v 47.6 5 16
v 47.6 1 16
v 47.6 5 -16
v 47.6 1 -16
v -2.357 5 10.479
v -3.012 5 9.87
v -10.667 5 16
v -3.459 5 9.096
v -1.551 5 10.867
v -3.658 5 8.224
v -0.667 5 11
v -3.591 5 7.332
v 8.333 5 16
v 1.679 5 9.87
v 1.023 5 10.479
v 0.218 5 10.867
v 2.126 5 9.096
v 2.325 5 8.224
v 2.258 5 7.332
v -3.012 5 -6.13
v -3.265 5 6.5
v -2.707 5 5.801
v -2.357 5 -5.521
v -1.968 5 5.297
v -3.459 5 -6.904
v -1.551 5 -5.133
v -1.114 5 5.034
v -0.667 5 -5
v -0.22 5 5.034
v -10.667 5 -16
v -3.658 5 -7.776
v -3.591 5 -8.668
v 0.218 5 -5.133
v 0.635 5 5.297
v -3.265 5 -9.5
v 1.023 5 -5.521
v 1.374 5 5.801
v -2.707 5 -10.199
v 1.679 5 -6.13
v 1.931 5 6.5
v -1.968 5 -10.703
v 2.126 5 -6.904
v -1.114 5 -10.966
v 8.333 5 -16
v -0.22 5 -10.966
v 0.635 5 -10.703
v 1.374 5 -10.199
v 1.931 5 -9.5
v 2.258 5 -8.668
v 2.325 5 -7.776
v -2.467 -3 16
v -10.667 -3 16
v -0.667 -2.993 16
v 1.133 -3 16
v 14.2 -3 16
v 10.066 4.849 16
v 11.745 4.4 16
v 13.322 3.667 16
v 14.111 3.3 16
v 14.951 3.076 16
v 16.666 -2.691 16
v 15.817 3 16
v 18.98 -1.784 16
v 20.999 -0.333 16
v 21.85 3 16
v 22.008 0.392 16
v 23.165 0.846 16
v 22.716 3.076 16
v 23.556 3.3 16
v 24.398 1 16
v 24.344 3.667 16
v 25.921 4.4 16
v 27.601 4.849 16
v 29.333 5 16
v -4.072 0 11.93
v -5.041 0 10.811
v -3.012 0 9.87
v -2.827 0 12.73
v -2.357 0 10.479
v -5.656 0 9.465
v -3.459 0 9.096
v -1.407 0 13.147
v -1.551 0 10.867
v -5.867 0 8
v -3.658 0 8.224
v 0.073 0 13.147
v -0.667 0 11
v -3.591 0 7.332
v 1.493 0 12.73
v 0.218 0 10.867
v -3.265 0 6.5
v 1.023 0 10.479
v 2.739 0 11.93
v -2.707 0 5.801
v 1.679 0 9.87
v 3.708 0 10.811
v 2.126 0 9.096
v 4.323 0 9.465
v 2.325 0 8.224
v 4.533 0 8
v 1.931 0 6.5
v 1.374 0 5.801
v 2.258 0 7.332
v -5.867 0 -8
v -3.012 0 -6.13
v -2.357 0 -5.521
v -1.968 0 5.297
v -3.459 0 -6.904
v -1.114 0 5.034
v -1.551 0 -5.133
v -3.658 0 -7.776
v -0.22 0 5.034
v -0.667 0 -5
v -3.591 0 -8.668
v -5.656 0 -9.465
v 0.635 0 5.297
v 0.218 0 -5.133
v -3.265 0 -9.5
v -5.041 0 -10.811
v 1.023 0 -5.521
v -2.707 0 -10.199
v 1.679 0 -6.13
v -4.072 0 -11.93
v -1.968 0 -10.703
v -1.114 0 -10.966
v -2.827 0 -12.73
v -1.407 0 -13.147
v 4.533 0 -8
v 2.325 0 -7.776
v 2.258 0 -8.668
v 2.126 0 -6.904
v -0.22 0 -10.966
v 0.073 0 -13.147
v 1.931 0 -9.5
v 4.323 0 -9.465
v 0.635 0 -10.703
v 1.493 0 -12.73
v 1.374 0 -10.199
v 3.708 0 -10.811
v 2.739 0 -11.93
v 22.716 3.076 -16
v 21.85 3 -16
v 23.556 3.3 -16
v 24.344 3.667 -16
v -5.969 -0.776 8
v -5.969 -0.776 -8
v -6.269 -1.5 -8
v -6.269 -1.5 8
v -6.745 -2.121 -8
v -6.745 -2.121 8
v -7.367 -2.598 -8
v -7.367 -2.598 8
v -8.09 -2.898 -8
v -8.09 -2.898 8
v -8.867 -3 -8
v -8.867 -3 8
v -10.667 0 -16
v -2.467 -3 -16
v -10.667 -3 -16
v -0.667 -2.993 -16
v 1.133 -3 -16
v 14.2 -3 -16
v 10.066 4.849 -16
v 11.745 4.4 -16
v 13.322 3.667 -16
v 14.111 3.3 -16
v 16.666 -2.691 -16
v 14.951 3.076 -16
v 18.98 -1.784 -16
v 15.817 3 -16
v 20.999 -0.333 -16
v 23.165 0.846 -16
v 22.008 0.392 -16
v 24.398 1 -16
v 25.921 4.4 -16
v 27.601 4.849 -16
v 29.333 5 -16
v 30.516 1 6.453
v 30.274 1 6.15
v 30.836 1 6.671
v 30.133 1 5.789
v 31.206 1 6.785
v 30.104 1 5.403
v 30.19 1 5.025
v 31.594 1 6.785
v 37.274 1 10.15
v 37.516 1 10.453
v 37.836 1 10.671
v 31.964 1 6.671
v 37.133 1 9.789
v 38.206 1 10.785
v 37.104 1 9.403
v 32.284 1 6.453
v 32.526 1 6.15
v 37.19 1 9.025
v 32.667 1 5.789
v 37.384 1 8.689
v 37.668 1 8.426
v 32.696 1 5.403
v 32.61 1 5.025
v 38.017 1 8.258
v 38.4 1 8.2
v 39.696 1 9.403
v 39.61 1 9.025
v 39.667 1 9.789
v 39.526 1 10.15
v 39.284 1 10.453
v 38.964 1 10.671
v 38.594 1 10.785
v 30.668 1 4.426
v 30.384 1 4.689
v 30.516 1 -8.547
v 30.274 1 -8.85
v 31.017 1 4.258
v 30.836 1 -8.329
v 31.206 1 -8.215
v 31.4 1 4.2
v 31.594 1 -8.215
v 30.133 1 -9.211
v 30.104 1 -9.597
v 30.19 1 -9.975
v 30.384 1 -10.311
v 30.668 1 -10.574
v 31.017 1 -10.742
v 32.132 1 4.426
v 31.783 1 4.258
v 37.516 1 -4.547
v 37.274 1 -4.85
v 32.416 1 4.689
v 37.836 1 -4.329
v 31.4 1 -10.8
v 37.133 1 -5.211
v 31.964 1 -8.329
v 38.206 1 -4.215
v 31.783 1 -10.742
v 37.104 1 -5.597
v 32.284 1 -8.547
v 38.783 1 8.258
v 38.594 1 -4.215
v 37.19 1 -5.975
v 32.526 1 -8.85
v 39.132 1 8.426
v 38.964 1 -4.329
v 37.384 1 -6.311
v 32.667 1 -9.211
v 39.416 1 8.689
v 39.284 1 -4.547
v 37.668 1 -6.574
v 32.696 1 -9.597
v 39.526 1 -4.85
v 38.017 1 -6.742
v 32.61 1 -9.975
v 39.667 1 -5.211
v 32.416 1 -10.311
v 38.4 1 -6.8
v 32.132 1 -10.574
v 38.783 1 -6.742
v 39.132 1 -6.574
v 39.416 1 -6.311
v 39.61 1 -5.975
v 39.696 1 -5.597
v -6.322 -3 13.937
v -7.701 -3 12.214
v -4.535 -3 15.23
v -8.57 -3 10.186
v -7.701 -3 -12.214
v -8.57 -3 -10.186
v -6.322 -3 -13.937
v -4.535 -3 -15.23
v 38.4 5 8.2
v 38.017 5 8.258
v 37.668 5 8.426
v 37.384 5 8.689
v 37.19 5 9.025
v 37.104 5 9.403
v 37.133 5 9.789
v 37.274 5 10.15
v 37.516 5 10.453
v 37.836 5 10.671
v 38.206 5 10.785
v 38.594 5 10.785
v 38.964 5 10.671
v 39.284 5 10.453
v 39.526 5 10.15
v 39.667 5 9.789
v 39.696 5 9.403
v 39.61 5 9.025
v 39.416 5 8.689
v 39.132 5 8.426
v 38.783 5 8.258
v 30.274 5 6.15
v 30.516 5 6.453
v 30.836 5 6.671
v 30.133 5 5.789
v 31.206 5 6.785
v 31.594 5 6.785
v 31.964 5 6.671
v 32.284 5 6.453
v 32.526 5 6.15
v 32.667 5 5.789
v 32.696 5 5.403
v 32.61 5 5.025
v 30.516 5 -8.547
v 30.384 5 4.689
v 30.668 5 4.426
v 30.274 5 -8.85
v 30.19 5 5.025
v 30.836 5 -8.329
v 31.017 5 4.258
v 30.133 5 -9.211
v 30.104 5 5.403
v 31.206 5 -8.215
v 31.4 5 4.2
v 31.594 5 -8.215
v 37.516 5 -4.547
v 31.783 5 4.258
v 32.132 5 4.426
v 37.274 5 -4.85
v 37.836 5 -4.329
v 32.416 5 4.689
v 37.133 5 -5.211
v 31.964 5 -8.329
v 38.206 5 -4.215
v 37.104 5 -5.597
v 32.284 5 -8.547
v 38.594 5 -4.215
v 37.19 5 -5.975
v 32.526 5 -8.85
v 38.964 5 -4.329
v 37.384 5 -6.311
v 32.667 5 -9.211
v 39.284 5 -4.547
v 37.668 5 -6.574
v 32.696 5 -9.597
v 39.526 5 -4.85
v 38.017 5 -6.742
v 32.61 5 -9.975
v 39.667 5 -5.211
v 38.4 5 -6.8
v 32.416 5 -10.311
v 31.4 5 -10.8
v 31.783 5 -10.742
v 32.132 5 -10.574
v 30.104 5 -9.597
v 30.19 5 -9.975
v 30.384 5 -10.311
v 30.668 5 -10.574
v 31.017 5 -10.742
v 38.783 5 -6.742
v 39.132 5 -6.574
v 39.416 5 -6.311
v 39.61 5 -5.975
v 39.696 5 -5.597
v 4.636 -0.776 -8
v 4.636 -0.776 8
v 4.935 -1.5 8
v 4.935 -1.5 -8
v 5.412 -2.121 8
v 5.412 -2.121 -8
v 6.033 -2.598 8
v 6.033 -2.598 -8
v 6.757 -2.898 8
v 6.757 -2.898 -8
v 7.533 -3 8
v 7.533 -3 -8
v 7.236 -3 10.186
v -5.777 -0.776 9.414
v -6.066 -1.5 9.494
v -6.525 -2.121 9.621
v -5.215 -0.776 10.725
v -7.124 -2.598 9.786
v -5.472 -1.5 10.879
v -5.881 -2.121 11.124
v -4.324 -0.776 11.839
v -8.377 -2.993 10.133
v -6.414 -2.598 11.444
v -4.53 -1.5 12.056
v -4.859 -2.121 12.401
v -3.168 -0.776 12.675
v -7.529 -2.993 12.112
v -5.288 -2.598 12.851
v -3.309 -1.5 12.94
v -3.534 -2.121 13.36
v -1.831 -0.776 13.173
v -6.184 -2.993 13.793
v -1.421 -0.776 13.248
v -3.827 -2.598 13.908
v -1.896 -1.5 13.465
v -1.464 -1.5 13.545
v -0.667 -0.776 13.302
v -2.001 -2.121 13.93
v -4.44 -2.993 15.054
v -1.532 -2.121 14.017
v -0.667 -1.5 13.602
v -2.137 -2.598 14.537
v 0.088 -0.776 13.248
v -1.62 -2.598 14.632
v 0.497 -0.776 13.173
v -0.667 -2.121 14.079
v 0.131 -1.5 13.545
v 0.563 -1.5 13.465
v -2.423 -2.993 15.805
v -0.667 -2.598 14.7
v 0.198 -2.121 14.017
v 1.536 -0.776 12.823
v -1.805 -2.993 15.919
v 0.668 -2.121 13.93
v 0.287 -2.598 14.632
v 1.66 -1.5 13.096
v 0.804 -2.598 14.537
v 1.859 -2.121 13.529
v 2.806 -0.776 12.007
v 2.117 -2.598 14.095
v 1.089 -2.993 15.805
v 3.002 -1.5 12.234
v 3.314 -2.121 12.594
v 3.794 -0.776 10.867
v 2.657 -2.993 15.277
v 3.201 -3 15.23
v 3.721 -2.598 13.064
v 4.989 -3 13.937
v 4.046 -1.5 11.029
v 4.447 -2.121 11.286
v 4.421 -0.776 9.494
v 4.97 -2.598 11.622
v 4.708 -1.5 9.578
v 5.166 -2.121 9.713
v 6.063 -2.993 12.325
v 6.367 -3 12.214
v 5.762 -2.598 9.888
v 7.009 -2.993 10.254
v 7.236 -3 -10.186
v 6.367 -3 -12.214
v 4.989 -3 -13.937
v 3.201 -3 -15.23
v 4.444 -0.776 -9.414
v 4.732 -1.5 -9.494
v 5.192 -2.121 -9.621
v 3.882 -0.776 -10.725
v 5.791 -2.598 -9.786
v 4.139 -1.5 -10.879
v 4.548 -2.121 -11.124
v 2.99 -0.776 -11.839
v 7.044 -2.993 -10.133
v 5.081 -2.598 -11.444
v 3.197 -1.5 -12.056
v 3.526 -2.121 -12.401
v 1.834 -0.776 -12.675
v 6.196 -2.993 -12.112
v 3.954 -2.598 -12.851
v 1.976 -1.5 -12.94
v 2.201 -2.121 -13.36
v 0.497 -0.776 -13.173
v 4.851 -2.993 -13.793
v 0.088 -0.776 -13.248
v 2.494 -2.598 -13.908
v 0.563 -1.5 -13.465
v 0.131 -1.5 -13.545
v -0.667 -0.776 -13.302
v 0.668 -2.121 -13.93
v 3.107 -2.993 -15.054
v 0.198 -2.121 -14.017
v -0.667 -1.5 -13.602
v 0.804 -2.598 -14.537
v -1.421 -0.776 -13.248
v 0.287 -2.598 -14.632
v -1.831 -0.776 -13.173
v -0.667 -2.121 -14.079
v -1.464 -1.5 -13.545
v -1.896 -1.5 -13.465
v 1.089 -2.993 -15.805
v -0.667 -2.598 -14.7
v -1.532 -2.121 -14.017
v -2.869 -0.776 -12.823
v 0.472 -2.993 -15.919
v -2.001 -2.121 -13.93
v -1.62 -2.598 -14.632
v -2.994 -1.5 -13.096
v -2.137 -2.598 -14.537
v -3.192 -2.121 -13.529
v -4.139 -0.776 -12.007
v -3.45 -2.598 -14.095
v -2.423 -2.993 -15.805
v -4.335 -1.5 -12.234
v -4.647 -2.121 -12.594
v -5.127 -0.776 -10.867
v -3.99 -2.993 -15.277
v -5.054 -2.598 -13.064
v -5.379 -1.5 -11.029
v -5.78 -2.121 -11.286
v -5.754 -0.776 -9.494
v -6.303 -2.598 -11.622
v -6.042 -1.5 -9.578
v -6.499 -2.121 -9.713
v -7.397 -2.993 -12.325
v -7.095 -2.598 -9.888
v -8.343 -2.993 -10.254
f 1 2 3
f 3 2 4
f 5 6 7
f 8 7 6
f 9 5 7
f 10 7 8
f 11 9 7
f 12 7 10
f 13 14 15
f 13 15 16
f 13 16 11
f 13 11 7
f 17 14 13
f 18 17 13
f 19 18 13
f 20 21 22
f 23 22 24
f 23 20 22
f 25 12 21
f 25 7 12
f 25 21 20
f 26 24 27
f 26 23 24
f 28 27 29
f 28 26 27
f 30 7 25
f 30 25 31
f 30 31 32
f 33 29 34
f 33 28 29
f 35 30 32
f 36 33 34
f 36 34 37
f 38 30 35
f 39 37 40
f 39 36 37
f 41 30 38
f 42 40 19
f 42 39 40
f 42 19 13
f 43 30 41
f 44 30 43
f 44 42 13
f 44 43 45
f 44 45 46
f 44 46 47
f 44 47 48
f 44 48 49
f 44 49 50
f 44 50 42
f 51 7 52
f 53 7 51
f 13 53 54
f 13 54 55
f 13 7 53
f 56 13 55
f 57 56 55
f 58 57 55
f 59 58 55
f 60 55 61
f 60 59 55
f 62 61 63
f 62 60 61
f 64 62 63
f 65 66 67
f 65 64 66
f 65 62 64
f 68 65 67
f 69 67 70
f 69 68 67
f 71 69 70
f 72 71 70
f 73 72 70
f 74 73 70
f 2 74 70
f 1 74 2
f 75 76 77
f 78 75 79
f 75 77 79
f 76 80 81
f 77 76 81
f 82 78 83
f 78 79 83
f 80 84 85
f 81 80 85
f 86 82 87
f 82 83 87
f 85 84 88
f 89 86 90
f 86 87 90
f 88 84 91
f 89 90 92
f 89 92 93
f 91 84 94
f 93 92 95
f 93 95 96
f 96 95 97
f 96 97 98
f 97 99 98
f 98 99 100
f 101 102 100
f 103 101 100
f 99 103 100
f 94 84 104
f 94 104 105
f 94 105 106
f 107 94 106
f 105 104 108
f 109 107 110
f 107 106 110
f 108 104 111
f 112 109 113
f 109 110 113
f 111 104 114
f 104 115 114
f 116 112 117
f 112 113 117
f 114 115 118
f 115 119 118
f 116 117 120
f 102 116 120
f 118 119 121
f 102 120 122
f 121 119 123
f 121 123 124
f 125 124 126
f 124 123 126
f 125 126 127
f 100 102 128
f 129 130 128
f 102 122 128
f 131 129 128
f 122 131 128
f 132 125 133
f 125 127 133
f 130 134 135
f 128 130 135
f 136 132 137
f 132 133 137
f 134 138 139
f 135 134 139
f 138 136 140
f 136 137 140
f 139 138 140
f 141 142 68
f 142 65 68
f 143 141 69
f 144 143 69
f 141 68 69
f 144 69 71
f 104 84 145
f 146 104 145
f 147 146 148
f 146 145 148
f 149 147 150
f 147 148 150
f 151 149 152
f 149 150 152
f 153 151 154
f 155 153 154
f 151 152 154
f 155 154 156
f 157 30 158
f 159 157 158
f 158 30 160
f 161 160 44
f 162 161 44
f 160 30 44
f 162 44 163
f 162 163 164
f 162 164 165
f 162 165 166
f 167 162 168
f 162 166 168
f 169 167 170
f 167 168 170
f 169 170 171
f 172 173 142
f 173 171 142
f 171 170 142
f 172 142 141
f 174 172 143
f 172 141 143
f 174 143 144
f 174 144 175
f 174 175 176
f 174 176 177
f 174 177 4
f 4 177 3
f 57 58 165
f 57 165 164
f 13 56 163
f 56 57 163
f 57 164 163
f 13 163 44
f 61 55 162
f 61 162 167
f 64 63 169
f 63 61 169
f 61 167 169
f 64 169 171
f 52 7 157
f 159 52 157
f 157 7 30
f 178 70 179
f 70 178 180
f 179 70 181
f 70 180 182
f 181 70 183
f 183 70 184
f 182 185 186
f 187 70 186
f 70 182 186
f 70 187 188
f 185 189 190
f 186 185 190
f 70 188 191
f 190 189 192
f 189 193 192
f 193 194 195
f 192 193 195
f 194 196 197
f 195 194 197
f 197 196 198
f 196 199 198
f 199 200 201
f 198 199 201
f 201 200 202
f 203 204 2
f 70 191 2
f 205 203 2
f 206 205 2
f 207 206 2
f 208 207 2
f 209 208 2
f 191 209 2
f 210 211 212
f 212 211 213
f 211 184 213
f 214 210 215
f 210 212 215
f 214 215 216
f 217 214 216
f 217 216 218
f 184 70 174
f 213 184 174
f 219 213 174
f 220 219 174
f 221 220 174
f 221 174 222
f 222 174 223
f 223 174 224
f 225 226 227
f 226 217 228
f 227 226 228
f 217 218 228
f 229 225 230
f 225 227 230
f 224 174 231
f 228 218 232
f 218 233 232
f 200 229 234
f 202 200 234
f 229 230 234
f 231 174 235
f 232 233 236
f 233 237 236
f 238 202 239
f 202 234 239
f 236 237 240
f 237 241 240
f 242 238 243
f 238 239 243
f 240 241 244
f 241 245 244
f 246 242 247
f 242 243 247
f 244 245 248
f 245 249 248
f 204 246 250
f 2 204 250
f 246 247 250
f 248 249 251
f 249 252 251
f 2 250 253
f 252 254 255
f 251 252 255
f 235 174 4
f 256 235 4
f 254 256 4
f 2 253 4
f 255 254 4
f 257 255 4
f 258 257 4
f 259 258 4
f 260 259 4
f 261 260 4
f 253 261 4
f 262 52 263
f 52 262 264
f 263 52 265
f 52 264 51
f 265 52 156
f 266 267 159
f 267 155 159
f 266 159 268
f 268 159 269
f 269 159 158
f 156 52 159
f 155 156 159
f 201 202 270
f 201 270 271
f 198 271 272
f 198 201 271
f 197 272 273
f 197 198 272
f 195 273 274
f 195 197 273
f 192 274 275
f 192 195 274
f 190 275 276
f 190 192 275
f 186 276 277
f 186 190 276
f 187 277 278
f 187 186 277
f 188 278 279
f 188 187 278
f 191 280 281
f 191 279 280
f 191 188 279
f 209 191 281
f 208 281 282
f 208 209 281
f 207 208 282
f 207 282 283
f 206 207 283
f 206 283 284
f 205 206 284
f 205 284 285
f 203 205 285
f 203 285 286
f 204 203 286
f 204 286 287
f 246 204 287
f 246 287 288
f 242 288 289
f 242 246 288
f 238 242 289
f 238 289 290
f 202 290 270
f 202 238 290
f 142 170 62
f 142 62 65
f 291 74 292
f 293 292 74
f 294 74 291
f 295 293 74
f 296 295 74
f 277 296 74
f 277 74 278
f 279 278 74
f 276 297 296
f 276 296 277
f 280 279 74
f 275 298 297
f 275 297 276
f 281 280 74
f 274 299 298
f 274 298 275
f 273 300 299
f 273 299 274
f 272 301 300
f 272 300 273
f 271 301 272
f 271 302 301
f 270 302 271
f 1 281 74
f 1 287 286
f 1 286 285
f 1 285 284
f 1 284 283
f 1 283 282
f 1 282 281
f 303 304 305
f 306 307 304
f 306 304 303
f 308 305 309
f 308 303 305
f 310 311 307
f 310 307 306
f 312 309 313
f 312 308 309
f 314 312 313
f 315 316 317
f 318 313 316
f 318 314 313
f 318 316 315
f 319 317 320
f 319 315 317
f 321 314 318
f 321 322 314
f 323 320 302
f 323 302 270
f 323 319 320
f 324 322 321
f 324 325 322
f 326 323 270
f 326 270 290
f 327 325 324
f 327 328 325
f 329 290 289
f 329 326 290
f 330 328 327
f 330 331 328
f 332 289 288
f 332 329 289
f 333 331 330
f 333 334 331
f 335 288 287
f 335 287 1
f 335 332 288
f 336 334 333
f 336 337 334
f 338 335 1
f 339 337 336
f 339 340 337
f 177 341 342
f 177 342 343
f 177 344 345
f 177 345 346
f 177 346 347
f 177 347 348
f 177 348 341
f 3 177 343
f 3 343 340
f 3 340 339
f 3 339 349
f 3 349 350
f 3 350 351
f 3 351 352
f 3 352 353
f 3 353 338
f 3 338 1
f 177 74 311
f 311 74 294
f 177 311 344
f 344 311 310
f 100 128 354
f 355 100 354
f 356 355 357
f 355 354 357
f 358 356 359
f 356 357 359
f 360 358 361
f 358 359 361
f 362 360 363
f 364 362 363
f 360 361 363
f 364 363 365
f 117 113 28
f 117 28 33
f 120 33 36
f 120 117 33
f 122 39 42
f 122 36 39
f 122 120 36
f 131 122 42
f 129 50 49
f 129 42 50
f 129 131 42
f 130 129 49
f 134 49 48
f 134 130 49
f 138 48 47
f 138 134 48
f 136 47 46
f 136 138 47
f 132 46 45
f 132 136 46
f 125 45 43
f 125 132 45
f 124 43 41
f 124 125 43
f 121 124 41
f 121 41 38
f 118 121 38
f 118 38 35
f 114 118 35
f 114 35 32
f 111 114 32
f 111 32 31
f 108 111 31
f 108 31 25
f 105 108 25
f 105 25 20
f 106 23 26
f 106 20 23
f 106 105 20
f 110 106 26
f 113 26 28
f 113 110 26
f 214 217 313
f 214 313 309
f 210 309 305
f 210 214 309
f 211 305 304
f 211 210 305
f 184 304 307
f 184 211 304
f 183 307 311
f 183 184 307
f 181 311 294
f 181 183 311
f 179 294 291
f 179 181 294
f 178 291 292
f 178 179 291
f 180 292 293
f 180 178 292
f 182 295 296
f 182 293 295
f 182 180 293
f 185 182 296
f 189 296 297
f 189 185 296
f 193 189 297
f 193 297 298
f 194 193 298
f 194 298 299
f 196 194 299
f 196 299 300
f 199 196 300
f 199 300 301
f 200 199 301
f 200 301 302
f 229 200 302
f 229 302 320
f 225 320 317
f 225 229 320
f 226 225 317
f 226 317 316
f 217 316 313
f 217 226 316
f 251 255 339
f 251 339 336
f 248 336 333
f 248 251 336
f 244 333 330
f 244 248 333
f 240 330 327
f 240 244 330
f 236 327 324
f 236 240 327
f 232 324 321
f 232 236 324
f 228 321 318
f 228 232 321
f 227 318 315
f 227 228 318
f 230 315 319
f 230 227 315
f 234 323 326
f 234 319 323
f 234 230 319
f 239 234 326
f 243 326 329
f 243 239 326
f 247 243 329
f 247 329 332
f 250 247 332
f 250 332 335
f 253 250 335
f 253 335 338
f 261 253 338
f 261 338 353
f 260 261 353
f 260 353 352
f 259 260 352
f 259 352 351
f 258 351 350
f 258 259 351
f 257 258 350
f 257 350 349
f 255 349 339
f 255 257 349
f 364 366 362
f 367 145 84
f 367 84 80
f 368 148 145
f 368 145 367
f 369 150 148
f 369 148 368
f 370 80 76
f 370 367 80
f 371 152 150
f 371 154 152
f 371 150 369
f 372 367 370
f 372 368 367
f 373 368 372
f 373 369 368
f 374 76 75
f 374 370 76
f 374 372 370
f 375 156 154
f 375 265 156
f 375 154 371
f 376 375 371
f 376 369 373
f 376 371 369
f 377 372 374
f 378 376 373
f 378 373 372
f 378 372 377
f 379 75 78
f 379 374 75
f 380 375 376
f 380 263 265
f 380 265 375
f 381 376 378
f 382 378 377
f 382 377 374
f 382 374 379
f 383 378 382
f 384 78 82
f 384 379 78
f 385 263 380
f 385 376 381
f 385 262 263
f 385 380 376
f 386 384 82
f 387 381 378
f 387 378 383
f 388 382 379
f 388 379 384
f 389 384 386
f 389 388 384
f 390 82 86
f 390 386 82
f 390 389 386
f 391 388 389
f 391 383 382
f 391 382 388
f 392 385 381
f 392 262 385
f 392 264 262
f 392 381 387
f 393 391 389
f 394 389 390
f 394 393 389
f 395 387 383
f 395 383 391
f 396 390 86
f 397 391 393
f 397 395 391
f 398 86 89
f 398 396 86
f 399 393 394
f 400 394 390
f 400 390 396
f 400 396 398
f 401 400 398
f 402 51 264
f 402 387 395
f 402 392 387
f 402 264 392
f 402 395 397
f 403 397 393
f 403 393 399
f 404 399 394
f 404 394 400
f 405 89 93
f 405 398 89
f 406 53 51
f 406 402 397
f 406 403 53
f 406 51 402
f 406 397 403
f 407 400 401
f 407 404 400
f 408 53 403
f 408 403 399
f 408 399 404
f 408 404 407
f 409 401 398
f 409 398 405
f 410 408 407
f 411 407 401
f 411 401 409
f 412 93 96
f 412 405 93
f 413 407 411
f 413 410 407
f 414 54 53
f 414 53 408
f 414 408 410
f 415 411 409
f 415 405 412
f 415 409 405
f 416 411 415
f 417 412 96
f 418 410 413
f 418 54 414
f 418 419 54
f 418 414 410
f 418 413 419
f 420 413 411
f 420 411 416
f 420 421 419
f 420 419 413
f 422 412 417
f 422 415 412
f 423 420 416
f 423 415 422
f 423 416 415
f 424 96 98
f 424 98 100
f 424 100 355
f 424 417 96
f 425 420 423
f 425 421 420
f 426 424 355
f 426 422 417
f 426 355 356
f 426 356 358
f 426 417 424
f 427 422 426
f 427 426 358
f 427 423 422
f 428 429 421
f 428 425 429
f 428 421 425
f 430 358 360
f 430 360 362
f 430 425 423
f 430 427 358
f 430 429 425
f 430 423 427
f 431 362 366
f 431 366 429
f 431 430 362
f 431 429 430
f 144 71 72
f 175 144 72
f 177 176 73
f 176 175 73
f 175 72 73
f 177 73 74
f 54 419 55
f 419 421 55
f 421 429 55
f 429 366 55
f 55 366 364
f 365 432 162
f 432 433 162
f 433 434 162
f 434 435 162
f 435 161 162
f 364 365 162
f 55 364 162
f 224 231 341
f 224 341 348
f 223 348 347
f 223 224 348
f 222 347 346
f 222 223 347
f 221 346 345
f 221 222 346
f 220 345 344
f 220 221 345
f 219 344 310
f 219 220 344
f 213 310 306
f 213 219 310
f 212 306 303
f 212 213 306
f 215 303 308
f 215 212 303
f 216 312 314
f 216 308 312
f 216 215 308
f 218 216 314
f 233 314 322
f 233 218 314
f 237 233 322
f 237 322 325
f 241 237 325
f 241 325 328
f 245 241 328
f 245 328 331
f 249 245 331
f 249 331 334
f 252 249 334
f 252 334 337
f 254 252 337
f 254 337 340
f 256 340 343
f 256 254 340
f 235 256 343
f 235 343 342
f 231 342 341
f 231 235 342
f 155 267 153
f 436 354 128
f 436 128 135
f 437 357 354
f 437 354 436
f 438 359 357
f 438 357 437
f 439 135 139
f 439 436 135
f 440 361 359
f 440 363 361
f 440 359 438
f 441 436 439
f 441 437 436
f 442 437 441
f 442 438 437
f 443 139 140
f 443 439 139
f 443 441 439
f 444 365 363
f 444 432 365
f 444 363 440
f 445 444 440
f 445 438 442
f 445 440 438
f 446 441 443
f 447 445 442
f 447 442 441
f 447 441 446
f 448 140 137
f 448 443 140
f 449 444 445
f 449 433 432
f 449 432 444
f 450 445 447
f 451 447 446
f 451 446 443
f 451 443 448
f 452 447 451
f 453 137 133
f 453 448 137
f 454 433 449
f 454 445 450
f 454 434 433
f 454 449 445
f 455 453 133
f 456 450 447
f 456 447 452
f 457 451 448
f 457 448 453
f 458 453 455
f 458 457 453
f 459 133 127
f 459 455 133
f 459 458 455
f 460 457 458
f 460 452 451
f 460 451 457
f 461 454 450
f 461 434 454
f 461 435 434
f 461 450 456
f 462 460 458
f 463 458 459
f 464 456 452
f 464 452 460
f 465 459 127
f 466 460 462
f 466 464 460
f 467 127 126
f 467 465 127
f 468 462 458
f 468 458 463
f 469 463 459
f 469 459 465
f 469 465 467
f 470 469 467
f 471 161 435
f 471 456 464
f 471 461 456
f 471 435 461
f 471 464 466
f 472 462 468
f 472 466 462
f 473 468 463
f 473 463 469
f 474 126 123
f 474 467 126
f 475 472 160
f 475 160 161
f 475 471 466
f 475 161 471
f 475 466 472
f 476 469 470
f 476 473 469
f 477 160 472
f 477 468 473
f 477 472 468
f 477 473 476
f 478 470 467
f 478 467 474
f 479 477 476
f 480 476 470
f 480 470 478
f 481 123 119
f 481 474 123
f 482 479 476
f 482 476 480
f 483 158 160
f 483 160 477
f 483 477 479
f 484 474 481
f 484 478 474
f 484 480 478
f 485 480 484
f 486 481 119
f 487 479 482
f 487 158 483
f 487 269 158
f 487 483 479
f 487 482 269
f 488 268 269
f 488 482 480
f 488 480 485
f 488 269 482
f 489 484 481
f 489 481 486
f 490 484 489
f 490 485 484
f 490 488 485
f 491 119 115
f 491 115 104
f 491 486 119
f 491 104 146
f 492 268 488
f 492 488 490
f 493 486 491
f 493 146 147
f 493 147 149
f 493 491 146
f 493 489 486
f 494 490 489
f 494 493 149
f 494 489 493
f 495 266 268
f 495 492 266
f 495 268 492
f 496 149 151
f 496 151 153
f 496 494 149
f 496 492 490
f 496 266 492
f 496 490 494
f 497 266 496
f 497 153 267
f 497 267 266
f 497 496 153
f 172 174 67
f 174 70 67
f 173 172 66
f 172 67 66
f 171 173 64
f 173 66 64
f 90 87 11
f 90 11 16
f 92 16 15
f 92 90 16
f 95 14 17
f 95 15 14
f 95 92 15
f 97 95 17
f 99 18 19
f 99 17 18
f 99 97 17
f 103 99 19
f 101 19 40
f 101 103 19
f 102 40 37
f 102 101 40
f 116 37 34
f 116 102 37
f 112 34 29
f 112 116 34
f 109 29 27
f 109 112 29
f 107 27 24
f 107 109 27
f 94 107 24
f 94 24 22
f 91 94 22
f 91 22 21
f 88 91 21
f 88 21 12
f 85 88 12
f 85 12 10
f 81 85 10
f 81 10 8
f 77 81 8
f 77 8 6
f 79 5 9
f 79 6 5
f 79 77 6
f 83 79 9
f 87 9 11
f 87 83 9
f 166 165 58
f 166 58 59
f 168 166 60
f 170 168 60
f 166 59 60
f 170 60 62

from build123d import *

# Parameters (mm, degrees)
SKETCH1_W               = 21.333333334
SKETCH1_H               = 32
BOSS_EXTRUDE1_DEPTH     = 5
SKETCH2_W               = 37.6
SKETCH2_H               = 32
BOSS_EXTRUDE2_DEPTH     = 5
SKETCH7_R               = 1.3
CUT_EXTRUDE2_DEPTH      = 10
CUT_EXTRUDE3_DEPTH      = 51.465433715
CUT_EXTRUDE3_DEPTH_BACK = 51.465433715
SKETCH8_W               = 25.4
SKETCH8_H               = 1
SKETCH8_W_2             = 9
SKETCH8_H_2             = 2
SKETCH9_W               = 32.866666667
SKETCH9_H               = 32
BOSS_EXTRUDE3_DEPTH     = 3
CUT_EXTRUDE4_DEPTH      = 51.465433715
CUT_EXTRUDE4_DEPTH_BACK = 51.465433715
SKETCH10_R              = 3
CUT_EXTRUDE5_DEPTH      = 8
FILLET8_R               = 3
FILLET9_R               = 10
FILLET10_R              = 5


with BuildPart() as part:
    # Sketch1 → Boss-Extrude1 (new body)
    with BuildSketch(Plane(origin=(0, 0, 0), x_dir=(1, 0, 0), z_dir=(0, 1, 0))):
        Rectangle(SKETCH1_W, SKETCH1_H)
    extrude(amount=BOSS_EXTRUDE1_DEPTH)

    # Sketch2 → Boss-Extrude2 (add)
    with BuildSketch(Plane(origin=(0, 0, 0), x_dir=(1, 0, 0), z_dir=(0, 1, 0))):
        with Locations((28.8, 0)):
            Rectangle(SKETCH2_W, SKETCH2_H)
    extrude(amount=BOSS_EXTRUDE2_DEPTH)

    # Sketch7 → Cut-Extrude2 (cut)
    with BuildSketch(Plane(origin=(0, 0, 0), x_dir=(1, 0, 0), z_dir=(0, 1, 0))):
        with Locations(Location((38.4, -9.5, 0), (0, 0, 90))):
            Circle(SKETCH7_R)
        with Locations(Location((31.4, -5.5, 0), (0, 0, 90))):
            Circle(SKETCH7_R)
        with Locations(Location((38.4, 5.5, 0), (0, 0, 90))):
            Circle(SKETCH7_R)
        with Locations(Location((31.4, 9.5, 0), (0, 0, 90))):
            Circle(SKETCH7_R)
    extrude(amount=CUT_EXTRUDE2_DEPTH, mode=Mode.SUBTRACT)

    # Sketch8 → Cut-Extrude3 (cut, two sides: drawn at the far end of the back side and taken through both)
    with BuildSketch(Plane.XY.offset(-CUT_EXTRUDE3_DEPTH_BACK)):
        with Locations((34.9, 0.5)):
            Rectangle(SKETCH8_W, SKETCH8_H)
        with Locations((18.833333333, 4)):
            Rectangle(SKETCH8_W_2, SKETCH8_H_2)
    extrude(amount=CUT_EXTRUDE3_DEPTH + CUT_EXTRUDE3_DEPTH_BACK, mode=Mode.SUBTRACT)

    # Sketch9 → Boss-Extrude3 (add)
    with BuildSketch(Plane(origin=(0, 0, 0), x_dir=(1, 0, 0), z_dir=(0, 1, 0))):
        with Locations((5.766666667, 0)):
            Rectangle(SKETCH9_W, SKETCH9_H)
    extrude(amount=-BOSS_EXTRUDE3_DEPTH)

    # Sketch10 → Cut-Extrude4 (cut, two sides: drawn at the far end of the back side and taken through both)
    with BuildSketch(Plane(origin=(0, 0, 0), x_dir=(1, 0, 0), z_dir=(0, 1, 0)).offset(-CUT_EXTRUDE4_DEPTH_BACK)):
        with Locations(Location((-0.666666667, 8, 0), (0, 0, 270))):
            Circle(SKETCH10_R)
        with Locations(Location((-0.666666667, -8, 0), (0, 0, 270))):
            Circle(SKETCH10_R)
    extrude(amount=CUT_EXTRUDE4_DEPTH + CUT_EXTRUDE4_DEPTH_BACK, mode=Mode.SUBTRACT)

    # Sketch11 → Cut-Extrude5 (cut)
    with BuildSketch(Plane(origin=(0, 0, 0), x_dir=(1, 0, 0), z_dir=(0, 1, 0))):
        with BuildLine():
            Line((-5.866666667, 8), (-5.866666667, -8))
            ThreePointArc((-5.866666667, -8), (-0.666666667, -13.2), (4.533333333, -8))
            Line((4.533333333, -8), (4.533333333, 8))
            ThreePointArc((4.533333333, 8), (-0.666666667, 13.2), (-5.866666667, 8))
        make_face()
    extrude(amount=-CUT_EXTRUDE5_DEPTH, mode=Mode.SUBTRACT)

    # Fillet8
    # the kernel refuses this fillet: 3 mm, written as the material it takes off along each edge
    with BuildSketch(Plane(origin=(-0.666666667, -3, -8), x_dir=(1, 0, 0), z_dir=(0, 0, 1))) as fillet8_piece_1:
        with BuildLine():
            CenterArc((5.2 + FILLET8_R, FILLET8_R), FILLET8_R, 180, 90)
            Line((5.2, FILLET8_R), (5.2, 0))
            Line((5.2, 0), (5.2 + FILLET8_R, 0))
        make_face()
    revolve(axis=Axis((-0.666666667, -3, -8), (0, 1, 0)), revolution_arc=180, mode=Mode.SUBTRACT)
    with BuildSketch(Plane(origin=(-0.666666667, -3, 8), x_dir=(-1, 0, 0), z_dir=(0, 0, -1))) as fillet8_piece_2:
        with BuildLine():
            CenterArc((5.2 + FILLET8_R, FILLET8_R), FILLET8_R, 180, 90)
            Line((5.2, FILLET8_R), (5.2, 0))
            Line((5.2, 0), (5.2 + FILLET8_R, 0))
        make_face()
    revolve(axis=Axis((-0.666666667, -3, 8), (0, 1, 0)), revolution_arc=180, mode=Mode.SUBTRACT)
    with BuildSketch(Plane(origin=(-5.866666667, -3, 8), x_dir=(-1, 0, 0), z_dir=(0, 0, -1)), Plane(origin=(4.533333333, -3, -8), x_dir=(1, 0, 0), z_dir=(0, 0, 1))) as fillet8_piece_3:
        with BuildLine():
            CenterArc((FILLET8_R, FILLET8_R), FILLET8_R, 180, 90)
            Line((0, FILLET8_R), (0, 0))
            Line((0, 0), (FILLET8_R, 0))
        make_face()
    extrude(amount=16, mode=Mode.SUBTRACT)

    # Fillet9
    # the kernel refuses this fillet: 10 mm, written as the material it takes off along each edge
    with BuildSketch(Plane(origin=(23.333333333, 5, 31), x_dir=(0, -1, 0), z_dir=(0, 0, -1))) as fillet9_piece_1:
        with BuildLine():
            CenterArc((10, -6), FILLET9_R, 143.130102354, 36.869897646)
            Line((0, -6), (-0.2, -6))
            Line((-0.2, -6), (-0.2, 0))
            Line((-0.2, 0), (0, 0.2))
            ThreePointArc((0, 0.2), (1, 0.2), (1.84, 0.12))
            Line((1.84, 0.12), (2, 0))
        make_face()
    extrude(amount=62, mode=Mode.SUBTRACT)
    with BuildSketch(Plane(origin=(14.333333333, 5, -31), x_dir=(-1, 0, 0), z_dir=(0, 0, 1))) as fillet9_piece_2:
        with BuildLine():
            CenterArc((6, 10), FILLET9_R, 233.130102354, 36.869897646)
            Line((0, 2), (-0.12, 1.84))
            ThreePointArc((-0.12, 1.84), (-0.2, 1), (-0.2, 0))
            Line((-0.2, 0), (0, -0.2))
            Line((0, -0.2), (6, -0.2))
            Line((6, -0.2), (6, 0))
        make_face()
    extrude(amount=62, mode=Mode.SUBTRACT)
    with BuildSketch(Plane(origin=(22.2, -3, -36), x_dir=(0, 1, 0), z_dir=(0, 0, 1))) as fillet9_piece_3:
        with BuildLine():
            CenterArc((10, 8), FILLET9_R, 180, 53.130102354)
            Line((0, 8), (-0.2, 8))
            Line((-0.2, 8), (-0.2, 0))
            Line((-0.2, 0), (0, -0.2))
            ThreePointArc((0, -0.2), (2, -0.2), (3.88, -0.16))
            Line((3.88, -0.16), (4, 0))
        make_face()
    extrude(amount=72, mode=Mode.SUBTRACT)

    # Fillet10
    fillet10_edges = [part.edges().sort_by_distance(p)[0] for p in [
        (22.2, 1, 0),
        (14.333333333, 3, 0),
        (23.333333333, 3, 0),
    ]]
    fillet(fillet10_edges, radius=FILLET10_R)


solid = part.part
